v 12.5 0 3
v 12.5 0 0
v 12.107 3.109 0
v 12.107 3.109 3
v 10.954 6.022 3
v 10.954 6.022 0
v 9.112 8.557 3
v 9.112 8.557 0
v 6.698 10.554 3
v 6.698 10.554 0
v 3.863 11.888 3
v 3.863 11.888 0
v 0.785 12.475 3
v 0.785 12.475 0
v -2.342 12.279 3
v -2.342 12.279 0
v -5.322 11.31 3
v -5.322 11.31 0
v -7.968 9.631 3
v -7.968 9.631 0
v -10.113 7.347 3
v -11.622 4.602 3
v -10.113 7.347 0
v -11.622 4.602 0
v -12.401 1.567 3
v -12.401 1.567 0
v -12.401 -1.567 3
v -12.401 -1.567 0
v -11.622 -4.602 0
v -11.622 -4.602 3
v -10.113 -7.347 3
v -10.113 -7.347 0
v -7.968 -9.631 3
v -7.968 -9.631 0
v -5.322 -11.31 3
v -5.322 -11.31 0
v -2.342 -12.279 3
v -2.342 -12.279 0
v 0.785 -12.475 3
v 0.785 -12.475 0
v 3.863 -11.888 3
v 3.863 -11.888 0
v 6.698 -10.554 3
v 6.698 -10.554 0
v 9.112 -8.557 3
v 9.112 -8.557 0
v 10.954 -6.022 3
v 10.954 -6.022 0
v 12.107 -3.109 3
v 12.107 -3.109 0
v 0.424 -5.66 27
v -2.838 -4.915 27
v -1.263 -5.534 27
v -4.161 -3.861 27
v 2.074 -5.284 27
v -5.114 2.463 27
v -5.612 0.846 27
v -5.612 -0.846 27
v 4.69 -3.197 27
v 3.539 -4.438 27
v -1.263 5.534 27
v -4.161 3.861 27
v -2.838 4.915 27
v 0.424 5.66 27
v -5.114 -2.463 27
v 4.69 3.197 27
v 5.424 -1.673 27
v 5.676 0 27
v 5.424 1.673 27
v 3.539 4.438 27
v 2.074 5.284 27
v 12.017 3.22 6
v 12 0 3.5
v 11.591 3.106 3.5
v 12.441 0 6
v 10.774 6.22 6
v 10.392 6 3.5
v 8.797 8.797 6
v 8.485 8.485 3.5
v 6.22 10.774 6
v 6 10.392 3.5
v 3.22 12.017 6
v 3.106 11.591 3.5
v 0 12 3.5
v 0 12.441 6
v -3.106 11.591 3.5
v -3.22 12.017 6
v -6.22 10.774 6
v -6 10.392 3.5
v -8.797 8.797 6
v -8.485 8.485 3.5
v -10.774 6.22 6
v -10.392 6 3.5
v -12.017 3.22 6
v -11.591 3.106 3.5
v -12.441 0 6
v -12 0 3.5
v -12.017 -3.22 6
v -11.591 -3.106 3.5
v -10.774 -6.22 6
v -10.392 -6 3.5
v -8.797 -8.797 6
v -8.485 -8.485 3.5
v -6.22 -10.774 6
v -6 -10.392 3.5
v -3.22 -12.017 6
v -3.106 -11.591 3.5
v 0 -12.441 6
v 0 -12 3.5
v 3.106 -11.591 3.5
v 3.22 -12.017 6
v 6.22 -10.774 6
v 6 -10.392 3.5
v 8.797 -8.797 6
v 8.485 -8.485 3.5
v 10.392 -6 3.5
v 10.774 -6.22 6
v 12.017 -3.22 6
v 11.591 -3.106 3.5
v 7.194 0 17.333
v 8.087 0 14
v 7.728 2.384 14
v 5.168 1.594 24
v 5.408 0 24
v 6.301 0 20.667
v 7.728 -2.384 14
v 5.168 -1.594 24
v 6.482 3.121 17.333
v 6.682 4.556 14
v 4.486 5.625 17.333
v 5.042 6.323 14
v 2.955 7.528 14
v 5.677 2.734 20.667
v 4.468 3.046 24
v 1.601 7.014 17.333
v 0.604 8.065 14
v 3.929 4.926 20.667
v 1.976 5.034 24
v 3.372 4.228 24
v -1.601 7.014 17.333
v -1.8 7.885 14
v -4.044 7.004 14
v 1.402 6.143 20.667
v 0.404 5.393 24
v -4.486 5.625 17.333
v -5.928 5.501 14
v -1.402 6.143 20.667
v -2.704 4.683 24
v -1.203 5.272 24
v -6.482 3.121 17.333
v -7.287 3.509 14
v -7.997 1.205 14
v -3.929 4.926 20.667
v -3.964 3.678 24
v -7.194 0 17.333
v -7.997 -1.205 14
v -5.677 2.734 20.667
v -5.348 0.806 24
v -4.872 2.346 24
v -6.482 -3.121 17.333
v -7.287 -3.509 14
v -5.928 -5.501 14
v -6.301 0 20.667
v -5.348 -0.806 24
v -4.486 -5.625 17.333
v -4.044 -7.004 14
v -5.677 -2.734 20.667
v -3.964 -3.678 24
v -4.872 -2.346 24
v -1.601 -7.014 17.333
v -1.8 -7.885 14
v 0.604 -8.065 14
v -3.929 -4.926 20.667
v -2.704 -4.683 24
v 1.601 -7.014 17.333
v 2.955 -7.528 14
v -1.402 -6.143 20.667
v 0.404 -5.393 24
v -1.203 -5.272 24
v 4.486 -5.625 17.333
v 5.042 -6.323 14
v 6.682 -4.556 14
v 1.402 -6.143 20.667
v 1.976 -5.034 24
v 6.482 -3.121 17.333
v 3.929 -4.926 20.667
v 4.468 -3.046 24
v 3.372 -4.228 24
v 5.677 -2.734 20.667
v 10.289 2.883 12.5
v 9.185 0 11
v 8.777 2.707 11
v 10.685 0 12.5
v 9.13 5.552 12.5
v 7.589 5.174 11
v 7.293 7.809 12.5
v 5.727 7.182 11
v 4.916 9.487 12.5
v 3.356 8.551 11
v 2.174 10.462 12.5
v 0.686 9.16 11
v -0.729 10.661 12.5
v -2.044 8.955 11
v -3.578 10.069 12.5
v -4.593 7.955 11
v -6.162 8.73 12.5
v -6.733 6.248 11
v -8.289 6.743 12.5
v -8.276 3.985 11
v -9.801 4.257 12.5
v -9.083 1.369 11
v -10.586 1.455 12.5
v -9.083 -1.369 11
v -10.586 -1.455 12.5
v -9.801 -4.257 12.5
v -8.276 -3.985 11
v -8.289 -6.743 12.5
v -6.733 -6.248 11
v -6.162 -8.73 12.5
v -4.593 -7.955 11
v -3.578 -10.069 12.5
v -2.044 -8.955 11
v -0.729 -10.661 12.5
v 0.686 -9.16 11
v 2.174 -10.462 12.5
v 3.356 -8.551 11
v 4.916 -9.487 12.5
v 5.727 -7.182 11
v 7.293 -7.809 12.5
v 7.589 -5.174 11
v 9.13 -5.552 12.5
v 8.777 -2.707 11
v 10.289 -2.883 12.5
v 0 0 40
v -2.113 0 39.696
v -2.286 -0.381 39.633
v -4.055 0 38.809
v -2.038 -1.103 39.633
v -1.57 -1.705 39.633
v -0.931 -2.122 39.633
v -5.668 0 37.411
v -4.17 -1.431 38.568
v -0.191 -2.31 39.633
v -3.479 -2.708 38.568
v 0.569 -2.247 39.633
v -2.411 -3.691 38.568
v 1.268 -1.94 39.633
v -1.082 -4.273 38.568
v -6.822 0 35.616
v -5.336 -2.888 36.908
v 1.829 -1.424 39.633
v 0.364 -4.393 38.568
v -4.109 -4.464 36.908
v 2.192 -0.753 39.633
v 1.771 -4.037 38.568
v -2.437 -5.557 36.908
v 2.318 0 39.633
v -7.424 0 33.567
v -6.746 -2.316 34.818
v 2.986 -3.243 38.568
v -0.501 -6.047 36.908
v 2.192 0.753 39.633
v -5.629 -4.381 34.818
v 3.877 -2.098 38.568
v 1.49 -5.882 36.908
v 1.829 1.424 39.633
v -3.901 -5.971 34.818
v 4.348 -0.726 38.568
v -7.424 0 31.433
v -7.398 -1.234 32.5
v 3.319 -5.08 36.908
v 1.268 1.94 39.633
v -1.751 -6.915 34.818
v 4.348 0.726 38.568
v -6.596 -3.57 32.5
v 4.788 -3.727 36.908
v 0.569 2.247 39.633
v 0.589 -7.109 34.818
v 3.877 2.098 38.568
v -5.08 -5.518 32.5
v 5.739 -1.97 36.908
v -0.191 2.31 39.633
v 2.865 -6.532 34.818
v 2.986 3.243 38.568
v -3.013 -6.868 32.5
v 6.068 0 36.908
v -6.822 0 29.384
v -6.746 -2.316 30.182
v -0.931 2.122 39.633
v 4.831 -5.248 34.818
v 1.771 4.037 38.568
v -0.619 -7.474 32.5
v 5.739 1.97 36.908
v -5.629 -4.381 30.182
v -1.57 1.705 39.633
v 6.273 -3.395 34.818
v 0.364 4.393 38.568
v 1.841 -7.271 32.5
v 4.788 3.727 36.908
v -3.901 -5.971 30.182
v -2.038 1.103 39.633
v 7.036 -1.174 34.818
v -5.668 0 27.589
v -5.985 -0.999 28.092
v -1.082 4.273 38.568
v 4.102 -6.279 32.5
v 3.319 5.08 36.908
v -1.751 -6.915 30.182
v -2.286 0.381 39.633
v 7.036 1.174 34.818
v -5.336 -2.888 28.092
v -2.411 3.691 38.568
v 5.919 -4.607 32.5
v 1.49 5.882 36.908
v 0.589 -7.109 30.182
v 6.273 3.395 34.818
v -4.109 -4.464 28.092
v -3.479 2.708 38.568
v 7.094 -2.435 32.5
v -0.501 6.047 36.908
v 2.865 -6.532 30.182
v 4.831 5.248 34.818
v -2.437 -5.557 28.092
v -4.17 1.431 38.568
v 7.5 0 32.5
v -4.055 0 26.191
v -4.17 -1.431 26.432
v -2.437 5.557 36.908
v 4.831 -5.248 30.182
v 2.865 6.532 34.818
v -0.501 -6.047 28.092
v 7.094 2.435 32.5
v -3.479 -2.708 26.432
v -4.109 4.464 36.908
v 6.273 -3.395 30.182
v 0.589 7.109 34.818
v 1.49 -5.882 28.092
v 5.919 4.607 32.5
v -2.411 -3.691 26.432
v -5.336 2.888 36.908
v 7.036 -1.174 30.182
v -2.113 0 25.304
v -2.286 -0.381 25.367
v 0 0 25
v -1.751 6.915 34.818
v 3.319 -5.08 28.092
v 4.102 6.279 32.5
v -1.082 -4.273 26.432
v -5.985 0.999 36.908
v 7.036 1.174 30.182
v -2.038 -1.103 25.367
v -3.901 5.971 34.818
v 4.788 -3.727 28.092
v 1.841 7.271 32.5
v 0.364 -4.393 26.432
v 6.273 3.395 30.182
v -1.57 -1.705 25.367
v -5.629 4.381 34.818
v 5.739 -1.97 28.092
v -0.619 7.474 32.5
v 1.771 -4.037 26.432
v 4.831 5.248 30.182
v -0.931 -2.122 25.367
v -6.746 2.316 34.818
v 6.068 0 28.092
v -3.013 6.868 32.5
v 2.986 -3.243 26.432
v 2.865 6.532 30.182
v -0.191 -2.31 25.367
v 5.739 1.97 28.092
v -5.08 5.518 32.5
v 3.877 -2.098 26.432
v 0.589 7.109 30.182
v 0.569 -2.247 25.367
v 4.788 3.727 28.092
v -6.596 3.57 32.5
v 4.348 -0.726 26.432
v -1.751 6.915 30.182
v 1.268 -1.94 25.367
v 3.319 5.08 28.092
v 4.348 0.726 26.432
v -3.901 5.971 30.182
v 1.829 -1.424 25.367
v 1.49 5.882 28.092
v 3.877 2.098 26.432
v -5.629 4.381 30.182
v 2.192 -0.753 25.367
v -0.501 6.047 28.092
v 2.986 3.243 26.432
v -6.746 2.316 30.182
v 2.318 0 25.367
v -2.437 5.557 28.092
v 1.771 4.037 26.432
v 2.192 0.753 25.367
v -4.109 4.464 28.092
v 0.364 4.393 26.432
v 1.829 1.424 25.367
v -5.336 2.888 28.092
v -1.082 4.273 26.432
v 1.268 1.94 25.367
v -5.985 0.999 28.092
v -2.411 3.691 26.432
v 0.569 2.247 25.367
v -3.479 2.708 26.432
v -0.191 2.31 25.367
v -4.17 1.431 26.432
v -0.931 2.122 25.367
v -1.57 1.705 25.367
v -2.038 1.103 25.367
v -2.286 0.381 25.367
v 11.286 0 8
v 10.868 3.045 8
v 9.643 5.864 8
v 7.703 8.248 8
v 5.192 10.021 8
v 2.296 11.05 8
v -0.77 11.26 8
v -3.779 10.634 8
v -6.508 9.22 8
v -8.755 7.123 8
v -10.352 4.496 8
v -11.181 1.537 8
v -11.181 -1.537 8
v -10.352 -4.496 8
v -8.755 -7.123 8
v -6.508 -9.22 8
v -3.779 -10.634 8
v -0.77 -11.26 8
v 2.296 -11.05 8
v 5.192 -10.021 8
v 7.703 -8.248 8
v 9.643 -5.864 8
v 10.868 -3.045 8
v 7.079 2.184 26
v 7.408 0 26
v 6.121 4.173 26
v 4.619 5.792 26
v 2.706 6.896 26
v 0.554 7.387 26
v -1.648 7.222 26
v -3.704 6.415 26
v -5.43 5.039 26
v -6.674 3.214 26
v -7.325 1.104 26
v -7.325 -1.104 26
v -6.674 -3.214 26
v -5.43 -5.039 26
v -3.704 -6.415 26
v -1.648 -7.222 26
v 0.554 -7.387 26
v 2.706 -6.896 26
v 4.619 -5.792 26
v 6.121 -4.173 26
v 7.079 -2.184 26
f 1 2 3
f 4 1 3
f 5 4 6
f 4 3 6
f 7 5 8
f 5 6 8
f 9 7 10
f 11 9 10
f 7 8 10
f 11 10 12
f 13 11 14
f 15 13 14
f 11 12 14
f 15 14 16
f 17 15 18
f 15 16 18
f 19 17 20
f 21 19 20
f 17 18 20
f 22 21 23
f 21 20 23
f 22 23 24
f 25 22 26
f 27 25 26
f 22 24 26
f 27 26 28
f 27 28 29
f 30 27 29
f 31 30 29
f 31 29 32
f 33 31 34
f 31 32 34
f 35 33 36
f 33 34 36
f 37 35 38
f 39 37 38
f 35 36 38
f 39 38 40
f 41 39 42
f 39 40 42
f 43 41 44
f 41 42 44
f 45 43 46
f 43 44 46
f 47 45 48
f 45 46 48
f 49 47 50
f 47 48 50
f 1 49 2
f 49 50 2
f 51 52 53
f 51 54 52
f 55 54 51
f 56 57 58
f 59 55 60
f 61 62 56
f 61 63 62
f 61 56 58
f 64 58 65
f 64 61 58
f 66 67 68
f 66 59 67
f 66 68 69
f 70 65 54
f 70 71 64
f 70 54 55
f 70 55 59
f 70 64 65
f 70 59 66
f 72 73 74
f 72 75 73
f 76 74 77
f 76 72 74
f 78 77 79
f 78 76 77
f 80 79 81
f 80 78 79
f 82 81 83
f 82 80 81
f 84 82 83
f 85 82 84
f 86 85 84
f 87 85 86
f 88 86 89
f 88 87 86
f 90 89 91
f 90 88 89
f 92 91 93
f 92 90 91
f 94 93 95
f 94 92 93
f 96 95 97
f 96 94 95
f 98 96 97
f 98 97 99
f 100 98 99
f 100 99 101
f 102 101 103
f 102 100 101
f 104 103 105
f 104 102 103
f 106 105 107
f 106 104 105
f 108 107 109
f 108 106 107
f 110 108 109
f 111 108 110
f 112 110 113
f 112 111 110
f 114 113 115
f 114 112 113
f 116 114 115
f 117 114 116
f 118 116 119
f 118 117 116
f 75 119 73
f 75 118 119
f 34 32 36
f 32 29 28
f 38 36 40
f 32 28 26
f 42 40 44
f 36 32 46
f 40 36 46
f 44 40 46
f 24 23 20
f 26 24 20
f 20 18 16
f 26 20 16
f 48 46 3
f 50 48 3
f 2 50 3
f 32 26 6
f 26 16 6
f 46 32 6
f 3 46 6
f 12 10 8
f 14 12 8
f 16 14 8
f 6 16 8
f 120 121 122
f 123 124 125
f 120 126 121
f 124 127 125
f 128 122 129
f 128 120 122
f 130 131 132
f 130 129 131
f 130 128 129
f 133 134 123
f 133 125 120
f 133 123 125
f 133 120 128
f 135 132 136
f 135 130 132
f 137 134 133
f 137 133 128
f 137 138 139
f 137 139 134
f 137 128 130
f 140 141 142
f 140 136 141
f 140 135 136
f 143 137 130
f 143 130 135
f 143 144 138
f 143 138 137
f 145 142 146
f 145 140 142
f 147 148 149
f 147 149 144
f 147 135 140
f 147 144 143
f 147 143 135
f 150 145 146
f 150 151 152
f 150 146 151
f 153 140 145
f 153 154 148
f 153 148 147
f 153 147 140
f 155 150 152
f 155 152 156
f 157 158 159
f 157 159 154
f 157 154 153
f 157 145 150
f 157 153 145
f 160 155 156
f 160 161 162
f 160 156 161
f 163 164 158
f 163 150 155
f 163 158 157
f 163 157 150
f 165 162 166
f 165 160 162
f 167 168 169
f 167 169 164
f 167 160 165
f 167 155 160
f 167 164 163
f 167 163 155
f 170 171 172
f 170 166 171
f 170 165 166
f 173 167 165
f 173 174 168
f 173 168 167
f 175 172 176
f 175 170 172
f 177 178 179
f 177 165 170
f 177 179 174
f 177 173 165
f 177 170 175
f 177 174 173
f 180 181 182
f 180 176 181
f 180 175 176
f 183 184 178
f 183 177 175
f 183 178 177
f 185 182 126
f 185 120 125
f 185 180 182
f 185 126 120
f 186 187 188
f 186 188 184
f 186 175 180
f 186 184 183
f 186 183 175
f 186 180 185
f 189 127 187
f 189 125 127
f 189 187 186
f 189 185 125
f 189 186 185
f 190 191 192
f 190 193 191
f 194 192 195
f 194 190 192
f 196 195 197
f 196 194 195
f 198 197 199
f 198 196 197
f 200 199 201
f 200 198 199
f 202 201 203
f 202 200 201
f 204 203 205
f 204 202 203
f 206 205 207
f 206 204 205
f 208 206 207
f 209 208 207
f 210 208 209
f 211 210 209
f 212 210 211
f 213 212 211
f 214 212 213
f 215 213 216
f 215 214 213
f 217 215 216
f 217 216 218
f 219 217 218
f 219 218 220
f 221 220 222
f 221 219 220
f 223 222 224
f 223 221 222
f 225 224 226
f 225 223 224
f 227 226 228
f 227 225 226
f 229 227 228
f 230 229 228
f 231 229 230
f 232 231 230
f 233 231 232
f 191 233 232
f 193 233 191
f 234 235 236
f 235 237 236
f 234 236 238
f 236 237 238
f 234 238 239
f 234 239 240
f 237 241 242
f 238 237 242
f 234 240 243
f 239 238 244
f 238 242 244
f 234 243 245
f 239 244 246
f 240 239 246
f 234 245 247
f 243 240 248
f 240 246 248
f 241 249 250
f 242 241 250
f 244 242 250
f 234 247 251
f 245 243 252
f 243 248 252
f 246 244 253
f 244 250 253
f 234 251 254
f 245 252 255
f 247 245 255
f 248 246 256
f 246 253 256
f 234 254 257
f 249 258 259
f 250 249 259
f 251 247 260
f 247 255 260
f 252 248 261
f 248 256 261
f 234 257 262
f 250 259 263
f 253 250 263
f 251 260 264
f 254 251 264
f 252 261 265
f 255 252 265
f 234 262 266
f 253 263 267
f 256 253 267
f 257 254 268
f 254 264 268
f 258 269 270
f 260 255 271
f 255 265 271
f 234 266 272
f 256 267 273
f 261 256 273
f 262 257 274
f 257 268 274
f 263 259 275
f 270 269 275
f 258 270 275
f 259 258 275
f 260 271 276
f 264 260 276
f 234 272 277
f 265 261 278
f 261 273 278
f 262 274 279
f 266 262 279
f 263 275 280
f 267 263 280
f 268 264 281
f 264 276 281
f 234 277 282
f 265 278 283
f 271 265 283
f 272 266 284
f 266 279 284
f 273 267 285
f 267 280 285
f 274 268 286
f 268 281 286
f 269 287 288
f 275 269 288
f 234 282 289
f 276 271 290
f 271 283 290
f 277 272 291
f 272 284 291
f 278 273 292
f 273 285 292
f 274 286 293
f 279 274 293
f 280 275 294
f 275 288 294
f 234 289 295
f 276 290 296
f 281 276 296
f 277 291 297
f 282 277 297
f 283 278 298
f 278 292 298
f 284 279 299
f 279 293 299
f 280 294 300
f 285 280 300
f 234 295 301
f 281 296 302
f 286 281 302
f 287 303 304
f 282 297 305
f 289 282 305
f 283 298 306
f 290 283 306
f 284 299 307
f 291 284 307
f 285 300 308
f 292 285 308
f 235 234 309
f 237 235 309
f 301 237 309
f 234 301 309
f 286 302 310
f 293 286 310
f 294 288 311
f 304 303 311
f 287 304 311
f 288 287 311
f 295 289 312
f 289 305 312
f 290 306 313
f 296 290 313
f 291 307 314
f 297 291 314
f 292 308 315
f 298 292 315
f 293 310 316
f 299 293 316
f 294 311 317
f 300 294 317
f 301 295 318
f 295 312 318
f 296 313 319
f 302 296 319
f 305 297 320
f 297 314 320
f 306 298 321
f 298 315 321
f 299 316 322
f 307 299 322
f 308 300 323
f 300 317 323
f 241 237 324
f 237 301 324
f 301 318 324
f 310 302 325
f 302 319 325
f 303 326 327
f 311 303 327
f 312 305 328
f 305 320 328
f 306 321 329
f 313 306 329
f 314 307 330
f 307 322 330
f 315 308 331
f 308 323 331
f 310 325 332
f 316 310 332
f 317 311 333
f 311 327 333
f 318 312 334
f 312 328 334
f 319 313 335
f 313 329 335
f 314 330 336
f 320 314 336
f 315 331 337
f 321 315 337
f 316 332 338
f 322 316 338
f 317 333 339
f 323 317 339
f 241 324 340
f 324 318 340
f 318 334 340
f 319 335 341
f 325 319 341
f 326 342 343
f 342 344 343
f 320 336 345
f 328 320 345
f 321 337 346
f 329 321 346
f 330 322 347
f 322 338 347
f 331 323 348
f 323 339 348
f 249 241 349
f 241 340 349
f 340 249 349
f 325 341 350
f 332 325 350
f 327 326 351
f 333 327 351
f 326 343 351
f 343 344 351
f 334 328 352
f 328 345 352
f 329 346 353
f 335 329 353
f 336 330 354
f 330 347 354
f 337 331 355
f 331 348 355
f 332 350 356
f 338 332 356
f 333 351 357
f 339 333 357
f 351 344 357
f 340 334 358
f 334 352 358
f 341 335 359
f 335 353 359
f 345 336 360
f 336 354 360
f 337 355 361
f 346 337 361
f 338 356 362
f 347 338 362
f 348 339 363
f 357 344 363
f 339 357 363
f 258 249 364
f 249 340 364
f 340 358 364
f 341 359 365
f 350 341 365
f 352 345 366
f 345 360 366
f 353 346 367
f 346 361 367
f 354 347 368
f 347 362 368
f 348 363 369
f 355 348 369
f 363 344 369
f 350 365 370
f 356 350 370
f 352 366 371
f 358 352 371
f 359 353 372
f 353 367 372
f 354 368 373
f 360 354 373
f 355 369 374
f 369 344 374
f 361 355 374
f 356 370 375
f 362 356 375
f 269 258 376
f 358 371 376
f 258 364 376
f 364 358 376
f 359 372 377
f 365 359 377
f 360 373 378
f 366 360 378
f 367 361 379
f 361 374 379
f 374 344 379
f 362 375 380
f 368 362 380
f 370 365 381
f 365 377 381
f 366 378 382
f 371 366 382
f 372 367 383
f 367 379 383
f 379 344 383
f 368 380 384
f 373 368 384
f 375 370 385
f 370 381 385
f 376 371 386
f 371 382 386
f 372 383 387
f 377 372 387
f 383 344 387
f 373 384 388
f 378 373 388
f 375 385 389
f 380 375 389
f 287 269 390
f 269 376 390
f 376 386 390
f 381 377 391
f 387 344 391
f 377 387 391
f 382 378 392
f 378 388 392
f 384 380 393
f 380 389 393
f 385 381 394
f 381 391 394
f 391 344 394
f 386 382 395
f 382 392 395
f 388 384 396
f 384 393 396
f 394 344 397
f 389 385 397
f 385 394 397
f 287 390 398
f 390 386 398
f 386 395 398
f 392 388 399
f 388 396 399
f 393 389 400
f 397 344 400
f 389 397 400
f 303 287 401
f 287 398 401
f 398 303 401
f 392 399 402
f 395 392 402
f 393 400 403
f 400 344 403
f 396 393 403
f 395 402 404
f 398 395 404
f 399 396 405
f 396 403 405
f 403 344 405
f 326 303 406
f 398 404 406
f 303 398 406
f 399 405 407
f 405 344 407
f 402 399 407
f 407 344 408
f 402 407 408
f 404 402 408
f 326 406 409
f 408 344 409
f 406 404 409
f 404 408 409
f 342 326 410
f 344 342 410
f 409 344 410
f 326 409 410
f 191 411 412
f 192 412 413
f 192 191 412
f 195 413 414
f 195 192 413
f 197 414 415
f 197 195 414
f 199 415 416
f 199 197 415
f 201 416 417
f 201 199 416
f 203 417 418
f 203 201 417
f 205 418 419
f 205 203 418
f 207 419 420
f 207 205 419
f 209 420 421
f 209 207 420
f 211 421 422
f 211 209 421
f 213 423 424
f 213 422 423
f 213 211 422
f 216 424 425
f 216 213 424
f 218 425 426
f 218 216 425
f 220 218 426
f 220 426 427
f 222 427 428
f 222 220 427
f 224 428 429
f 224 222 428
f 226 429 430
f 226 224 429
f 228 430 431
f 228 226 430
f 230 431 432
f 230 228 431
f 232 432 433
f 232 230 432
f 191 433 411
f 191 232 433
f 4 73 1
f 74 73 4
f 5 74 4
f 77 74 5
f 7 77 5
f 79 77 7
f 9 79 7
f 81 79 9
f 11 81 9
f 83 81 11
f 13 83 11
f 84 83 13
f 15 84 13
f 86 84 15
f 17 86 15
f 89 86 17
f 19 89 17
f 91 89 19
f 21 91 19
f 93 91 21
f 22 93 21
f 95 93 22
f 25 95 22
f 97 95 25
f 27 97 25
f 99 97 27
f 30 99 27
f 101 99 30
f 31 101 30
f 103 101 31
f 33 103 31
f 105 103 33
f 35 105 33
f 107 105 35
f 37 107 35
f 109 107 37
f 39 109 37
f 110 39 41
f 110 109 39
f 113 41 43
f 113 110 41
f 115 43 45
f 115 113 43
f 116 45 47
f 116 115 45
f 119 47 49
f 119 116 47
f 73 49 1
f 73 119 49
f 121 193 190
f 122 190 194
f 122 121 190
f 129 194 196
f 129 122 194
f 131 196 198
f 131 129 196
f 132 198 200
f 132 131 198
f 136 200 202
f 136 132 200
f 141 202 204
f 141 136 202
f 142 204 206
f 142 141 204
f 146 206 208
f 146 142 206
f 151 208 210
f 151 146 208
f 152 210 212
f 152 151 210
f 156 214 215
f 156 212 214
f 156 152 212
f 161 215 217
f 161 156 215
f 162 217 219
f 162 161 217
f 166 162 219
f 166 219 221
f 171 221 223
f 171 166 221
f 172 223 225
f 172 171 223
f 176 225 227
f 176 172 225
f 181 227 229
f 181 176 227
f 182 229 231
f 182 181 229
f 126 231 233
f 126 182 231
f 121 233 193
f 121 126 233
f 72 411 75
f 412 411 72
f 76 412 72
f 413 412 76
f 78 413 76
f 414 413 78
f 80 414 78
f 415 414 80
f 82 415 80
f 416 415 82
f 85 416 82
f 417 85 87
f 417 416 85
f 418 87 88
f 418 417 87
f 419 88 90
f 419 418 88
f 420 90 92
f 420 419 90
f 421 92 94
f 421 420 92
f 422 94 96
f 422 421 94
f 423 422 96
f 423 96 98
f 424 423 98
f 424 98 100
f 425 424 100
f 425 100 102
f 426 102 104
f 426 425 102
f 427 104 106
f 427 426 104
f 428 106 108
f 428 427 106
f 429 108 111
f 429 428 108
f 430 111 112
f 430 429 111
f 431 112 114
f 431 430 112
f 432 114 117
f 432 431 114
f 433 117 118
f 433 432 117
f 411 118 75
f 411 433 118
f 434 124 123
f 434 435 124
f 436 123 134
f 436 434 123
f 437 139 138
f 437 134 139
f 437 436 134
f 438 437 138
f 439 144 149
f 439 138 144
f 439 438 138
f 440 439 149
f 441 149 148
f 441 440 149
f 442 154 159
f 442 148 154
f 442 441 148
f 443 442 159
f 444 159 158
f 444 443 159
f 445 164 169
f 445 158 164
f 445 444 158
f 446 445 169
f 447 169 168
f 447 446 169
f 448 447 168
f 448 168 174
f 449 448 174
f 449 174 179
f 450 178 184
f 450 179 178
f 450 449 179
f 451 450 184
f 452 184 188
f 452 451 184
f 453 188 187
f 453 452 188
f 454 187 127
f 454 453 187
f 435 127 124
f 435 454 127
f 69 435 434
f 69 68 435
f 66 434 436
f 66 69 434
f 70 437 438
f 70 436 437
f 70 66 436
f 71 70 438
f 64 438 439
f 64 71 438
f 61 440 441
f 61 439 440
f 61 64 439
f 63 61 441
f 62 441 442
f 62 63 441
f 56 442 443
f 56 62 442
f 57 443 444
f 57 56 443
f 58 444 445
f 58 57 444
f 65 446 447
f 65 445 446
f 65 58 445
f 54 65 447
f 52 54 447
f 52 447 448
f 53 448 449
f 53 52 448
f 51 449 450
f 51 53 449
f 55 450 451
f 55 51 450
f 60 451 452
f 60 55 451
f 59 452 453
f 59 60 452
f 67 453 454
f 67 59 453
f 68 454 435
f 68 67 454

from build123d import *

# Parameters (mm, degrees)
F0_R      = 12.5
F1_DEPTH  = 3
F1_FACE_R = 12.5
F2_DEPTH  = 0.5
F2_TAPER  = 45
F2_FACE_R = 12
F3_DEPTH  = 2.5
F3_TAPER  = -10
F3_FACE_R = 12.4408174518
F4_DEPTH  = 2
F4_TAPER  = 30
F4_FACE_R = 11.2861169134
F5_DEPTH  = 3
F5_TAPER  = 35
F5_FACE_R = 9.1854942988
F6_DEPTH  = 1.5
F6_TAPER  = -45
F6_FACE_R = 10.6854942988
F7_DEPTH  = 1.5
F7_TAPER  = 60
F7_FACE_R = 8.0874180874
F8_DEPTH  = 10
F8_TAPER  = 15
F8_FACE_R = 5.4079261631
F9_DEPTH  = 2
F9_TAPER  = -45
F9_FACE_R = 7.4079261631
F10_DEPTH = 1
F10_TAPER = 60


with BuildPart() as f1:
    # F0 (on Top) → F1 (new body)
    with BuildSketch(Plane.XY):
        Circle(F0_R)
    extrude(amount=F1_DEPTH)

    # F1_face (on face) → F2 (join)
    with BuildSketch(Plane.XY.offset(3)):
        Circle(F1_FACE_R)
    extrude(amount=F2_DEPTH, taper=F2_TAPER)

    # F2_face (on face) → F3 (join)
    with BuildSketch(Plane.XY.offset(3.5)):
        Circle(F2_FACE_R)
    extrude(amount=F3_DEPTH, taper=F3_TAPER)

    # F3_face (on face) → F4 (join)
    with BuildSketch(Plane.XY.offset(6)):
        Circle(F3_FACE_R)
    extrude(amount=F4_DEPTH, taper=F4_TAPER)

    # F4_face (on face) → F5 (join)
    with BuildSketch(Plane.XY.offset(8)):
        Circle(F4_FACE_R)
    extrude(amount=F5_DEPTH, taper=F5_TAPER)

    # F5_face (on face) → F6 (join)
    with BuildSketch(Plane.XY.offset(11)):
        Circle(F5_FACE_R)
    extrude(amount=F6_DEPTH, taper=F6_TAPER)

    # F6_face (on face) → F7 (join)
    with BuildSketch(Plane.XY.offset(12.5)):
        Circle(F6_FACE_R)
    extrude(amount=F7_DEPTH, taper=F7_TAPER)

    # F7_face (on face) → F8 (join)
    with BuildSketch(Plane.XY.offset(14)):
        Circle(F7_FACE_R)
    extrude(amount=F8_DEPTH, taper=F8_TAPER)

    # F8_face (on face) → F9 (join)
    with BuildSketch(Plane.XY.offset(24)):
        Circle(F8_FACE_R)
    extrude(amount=F9_DEPTH, taper=F9_TAPER)

    # F9_face (on face) → F10 (join)
    with BuildSketch(Plane.XY.offset(26)):
        Circle(F9_FACE_R)
    extrude(amount=F10_DEPTH, taper=F10_TAPER)


with BuildPart() as f12:
    # F11 (on Front) → F12 (revolve)
    with BuildSketch(Plane.XZ):
        with BuildLine():
            ThreePointArc((0, 40), (-7.5, 32.5), (0, 25))
            Line((0, 25), (0, 40))
        make_face()
    revolve(axis=Axis((0, 0, 32.5), (0, 0, 1)))


solid = Compound([f1.part, f12.part])
